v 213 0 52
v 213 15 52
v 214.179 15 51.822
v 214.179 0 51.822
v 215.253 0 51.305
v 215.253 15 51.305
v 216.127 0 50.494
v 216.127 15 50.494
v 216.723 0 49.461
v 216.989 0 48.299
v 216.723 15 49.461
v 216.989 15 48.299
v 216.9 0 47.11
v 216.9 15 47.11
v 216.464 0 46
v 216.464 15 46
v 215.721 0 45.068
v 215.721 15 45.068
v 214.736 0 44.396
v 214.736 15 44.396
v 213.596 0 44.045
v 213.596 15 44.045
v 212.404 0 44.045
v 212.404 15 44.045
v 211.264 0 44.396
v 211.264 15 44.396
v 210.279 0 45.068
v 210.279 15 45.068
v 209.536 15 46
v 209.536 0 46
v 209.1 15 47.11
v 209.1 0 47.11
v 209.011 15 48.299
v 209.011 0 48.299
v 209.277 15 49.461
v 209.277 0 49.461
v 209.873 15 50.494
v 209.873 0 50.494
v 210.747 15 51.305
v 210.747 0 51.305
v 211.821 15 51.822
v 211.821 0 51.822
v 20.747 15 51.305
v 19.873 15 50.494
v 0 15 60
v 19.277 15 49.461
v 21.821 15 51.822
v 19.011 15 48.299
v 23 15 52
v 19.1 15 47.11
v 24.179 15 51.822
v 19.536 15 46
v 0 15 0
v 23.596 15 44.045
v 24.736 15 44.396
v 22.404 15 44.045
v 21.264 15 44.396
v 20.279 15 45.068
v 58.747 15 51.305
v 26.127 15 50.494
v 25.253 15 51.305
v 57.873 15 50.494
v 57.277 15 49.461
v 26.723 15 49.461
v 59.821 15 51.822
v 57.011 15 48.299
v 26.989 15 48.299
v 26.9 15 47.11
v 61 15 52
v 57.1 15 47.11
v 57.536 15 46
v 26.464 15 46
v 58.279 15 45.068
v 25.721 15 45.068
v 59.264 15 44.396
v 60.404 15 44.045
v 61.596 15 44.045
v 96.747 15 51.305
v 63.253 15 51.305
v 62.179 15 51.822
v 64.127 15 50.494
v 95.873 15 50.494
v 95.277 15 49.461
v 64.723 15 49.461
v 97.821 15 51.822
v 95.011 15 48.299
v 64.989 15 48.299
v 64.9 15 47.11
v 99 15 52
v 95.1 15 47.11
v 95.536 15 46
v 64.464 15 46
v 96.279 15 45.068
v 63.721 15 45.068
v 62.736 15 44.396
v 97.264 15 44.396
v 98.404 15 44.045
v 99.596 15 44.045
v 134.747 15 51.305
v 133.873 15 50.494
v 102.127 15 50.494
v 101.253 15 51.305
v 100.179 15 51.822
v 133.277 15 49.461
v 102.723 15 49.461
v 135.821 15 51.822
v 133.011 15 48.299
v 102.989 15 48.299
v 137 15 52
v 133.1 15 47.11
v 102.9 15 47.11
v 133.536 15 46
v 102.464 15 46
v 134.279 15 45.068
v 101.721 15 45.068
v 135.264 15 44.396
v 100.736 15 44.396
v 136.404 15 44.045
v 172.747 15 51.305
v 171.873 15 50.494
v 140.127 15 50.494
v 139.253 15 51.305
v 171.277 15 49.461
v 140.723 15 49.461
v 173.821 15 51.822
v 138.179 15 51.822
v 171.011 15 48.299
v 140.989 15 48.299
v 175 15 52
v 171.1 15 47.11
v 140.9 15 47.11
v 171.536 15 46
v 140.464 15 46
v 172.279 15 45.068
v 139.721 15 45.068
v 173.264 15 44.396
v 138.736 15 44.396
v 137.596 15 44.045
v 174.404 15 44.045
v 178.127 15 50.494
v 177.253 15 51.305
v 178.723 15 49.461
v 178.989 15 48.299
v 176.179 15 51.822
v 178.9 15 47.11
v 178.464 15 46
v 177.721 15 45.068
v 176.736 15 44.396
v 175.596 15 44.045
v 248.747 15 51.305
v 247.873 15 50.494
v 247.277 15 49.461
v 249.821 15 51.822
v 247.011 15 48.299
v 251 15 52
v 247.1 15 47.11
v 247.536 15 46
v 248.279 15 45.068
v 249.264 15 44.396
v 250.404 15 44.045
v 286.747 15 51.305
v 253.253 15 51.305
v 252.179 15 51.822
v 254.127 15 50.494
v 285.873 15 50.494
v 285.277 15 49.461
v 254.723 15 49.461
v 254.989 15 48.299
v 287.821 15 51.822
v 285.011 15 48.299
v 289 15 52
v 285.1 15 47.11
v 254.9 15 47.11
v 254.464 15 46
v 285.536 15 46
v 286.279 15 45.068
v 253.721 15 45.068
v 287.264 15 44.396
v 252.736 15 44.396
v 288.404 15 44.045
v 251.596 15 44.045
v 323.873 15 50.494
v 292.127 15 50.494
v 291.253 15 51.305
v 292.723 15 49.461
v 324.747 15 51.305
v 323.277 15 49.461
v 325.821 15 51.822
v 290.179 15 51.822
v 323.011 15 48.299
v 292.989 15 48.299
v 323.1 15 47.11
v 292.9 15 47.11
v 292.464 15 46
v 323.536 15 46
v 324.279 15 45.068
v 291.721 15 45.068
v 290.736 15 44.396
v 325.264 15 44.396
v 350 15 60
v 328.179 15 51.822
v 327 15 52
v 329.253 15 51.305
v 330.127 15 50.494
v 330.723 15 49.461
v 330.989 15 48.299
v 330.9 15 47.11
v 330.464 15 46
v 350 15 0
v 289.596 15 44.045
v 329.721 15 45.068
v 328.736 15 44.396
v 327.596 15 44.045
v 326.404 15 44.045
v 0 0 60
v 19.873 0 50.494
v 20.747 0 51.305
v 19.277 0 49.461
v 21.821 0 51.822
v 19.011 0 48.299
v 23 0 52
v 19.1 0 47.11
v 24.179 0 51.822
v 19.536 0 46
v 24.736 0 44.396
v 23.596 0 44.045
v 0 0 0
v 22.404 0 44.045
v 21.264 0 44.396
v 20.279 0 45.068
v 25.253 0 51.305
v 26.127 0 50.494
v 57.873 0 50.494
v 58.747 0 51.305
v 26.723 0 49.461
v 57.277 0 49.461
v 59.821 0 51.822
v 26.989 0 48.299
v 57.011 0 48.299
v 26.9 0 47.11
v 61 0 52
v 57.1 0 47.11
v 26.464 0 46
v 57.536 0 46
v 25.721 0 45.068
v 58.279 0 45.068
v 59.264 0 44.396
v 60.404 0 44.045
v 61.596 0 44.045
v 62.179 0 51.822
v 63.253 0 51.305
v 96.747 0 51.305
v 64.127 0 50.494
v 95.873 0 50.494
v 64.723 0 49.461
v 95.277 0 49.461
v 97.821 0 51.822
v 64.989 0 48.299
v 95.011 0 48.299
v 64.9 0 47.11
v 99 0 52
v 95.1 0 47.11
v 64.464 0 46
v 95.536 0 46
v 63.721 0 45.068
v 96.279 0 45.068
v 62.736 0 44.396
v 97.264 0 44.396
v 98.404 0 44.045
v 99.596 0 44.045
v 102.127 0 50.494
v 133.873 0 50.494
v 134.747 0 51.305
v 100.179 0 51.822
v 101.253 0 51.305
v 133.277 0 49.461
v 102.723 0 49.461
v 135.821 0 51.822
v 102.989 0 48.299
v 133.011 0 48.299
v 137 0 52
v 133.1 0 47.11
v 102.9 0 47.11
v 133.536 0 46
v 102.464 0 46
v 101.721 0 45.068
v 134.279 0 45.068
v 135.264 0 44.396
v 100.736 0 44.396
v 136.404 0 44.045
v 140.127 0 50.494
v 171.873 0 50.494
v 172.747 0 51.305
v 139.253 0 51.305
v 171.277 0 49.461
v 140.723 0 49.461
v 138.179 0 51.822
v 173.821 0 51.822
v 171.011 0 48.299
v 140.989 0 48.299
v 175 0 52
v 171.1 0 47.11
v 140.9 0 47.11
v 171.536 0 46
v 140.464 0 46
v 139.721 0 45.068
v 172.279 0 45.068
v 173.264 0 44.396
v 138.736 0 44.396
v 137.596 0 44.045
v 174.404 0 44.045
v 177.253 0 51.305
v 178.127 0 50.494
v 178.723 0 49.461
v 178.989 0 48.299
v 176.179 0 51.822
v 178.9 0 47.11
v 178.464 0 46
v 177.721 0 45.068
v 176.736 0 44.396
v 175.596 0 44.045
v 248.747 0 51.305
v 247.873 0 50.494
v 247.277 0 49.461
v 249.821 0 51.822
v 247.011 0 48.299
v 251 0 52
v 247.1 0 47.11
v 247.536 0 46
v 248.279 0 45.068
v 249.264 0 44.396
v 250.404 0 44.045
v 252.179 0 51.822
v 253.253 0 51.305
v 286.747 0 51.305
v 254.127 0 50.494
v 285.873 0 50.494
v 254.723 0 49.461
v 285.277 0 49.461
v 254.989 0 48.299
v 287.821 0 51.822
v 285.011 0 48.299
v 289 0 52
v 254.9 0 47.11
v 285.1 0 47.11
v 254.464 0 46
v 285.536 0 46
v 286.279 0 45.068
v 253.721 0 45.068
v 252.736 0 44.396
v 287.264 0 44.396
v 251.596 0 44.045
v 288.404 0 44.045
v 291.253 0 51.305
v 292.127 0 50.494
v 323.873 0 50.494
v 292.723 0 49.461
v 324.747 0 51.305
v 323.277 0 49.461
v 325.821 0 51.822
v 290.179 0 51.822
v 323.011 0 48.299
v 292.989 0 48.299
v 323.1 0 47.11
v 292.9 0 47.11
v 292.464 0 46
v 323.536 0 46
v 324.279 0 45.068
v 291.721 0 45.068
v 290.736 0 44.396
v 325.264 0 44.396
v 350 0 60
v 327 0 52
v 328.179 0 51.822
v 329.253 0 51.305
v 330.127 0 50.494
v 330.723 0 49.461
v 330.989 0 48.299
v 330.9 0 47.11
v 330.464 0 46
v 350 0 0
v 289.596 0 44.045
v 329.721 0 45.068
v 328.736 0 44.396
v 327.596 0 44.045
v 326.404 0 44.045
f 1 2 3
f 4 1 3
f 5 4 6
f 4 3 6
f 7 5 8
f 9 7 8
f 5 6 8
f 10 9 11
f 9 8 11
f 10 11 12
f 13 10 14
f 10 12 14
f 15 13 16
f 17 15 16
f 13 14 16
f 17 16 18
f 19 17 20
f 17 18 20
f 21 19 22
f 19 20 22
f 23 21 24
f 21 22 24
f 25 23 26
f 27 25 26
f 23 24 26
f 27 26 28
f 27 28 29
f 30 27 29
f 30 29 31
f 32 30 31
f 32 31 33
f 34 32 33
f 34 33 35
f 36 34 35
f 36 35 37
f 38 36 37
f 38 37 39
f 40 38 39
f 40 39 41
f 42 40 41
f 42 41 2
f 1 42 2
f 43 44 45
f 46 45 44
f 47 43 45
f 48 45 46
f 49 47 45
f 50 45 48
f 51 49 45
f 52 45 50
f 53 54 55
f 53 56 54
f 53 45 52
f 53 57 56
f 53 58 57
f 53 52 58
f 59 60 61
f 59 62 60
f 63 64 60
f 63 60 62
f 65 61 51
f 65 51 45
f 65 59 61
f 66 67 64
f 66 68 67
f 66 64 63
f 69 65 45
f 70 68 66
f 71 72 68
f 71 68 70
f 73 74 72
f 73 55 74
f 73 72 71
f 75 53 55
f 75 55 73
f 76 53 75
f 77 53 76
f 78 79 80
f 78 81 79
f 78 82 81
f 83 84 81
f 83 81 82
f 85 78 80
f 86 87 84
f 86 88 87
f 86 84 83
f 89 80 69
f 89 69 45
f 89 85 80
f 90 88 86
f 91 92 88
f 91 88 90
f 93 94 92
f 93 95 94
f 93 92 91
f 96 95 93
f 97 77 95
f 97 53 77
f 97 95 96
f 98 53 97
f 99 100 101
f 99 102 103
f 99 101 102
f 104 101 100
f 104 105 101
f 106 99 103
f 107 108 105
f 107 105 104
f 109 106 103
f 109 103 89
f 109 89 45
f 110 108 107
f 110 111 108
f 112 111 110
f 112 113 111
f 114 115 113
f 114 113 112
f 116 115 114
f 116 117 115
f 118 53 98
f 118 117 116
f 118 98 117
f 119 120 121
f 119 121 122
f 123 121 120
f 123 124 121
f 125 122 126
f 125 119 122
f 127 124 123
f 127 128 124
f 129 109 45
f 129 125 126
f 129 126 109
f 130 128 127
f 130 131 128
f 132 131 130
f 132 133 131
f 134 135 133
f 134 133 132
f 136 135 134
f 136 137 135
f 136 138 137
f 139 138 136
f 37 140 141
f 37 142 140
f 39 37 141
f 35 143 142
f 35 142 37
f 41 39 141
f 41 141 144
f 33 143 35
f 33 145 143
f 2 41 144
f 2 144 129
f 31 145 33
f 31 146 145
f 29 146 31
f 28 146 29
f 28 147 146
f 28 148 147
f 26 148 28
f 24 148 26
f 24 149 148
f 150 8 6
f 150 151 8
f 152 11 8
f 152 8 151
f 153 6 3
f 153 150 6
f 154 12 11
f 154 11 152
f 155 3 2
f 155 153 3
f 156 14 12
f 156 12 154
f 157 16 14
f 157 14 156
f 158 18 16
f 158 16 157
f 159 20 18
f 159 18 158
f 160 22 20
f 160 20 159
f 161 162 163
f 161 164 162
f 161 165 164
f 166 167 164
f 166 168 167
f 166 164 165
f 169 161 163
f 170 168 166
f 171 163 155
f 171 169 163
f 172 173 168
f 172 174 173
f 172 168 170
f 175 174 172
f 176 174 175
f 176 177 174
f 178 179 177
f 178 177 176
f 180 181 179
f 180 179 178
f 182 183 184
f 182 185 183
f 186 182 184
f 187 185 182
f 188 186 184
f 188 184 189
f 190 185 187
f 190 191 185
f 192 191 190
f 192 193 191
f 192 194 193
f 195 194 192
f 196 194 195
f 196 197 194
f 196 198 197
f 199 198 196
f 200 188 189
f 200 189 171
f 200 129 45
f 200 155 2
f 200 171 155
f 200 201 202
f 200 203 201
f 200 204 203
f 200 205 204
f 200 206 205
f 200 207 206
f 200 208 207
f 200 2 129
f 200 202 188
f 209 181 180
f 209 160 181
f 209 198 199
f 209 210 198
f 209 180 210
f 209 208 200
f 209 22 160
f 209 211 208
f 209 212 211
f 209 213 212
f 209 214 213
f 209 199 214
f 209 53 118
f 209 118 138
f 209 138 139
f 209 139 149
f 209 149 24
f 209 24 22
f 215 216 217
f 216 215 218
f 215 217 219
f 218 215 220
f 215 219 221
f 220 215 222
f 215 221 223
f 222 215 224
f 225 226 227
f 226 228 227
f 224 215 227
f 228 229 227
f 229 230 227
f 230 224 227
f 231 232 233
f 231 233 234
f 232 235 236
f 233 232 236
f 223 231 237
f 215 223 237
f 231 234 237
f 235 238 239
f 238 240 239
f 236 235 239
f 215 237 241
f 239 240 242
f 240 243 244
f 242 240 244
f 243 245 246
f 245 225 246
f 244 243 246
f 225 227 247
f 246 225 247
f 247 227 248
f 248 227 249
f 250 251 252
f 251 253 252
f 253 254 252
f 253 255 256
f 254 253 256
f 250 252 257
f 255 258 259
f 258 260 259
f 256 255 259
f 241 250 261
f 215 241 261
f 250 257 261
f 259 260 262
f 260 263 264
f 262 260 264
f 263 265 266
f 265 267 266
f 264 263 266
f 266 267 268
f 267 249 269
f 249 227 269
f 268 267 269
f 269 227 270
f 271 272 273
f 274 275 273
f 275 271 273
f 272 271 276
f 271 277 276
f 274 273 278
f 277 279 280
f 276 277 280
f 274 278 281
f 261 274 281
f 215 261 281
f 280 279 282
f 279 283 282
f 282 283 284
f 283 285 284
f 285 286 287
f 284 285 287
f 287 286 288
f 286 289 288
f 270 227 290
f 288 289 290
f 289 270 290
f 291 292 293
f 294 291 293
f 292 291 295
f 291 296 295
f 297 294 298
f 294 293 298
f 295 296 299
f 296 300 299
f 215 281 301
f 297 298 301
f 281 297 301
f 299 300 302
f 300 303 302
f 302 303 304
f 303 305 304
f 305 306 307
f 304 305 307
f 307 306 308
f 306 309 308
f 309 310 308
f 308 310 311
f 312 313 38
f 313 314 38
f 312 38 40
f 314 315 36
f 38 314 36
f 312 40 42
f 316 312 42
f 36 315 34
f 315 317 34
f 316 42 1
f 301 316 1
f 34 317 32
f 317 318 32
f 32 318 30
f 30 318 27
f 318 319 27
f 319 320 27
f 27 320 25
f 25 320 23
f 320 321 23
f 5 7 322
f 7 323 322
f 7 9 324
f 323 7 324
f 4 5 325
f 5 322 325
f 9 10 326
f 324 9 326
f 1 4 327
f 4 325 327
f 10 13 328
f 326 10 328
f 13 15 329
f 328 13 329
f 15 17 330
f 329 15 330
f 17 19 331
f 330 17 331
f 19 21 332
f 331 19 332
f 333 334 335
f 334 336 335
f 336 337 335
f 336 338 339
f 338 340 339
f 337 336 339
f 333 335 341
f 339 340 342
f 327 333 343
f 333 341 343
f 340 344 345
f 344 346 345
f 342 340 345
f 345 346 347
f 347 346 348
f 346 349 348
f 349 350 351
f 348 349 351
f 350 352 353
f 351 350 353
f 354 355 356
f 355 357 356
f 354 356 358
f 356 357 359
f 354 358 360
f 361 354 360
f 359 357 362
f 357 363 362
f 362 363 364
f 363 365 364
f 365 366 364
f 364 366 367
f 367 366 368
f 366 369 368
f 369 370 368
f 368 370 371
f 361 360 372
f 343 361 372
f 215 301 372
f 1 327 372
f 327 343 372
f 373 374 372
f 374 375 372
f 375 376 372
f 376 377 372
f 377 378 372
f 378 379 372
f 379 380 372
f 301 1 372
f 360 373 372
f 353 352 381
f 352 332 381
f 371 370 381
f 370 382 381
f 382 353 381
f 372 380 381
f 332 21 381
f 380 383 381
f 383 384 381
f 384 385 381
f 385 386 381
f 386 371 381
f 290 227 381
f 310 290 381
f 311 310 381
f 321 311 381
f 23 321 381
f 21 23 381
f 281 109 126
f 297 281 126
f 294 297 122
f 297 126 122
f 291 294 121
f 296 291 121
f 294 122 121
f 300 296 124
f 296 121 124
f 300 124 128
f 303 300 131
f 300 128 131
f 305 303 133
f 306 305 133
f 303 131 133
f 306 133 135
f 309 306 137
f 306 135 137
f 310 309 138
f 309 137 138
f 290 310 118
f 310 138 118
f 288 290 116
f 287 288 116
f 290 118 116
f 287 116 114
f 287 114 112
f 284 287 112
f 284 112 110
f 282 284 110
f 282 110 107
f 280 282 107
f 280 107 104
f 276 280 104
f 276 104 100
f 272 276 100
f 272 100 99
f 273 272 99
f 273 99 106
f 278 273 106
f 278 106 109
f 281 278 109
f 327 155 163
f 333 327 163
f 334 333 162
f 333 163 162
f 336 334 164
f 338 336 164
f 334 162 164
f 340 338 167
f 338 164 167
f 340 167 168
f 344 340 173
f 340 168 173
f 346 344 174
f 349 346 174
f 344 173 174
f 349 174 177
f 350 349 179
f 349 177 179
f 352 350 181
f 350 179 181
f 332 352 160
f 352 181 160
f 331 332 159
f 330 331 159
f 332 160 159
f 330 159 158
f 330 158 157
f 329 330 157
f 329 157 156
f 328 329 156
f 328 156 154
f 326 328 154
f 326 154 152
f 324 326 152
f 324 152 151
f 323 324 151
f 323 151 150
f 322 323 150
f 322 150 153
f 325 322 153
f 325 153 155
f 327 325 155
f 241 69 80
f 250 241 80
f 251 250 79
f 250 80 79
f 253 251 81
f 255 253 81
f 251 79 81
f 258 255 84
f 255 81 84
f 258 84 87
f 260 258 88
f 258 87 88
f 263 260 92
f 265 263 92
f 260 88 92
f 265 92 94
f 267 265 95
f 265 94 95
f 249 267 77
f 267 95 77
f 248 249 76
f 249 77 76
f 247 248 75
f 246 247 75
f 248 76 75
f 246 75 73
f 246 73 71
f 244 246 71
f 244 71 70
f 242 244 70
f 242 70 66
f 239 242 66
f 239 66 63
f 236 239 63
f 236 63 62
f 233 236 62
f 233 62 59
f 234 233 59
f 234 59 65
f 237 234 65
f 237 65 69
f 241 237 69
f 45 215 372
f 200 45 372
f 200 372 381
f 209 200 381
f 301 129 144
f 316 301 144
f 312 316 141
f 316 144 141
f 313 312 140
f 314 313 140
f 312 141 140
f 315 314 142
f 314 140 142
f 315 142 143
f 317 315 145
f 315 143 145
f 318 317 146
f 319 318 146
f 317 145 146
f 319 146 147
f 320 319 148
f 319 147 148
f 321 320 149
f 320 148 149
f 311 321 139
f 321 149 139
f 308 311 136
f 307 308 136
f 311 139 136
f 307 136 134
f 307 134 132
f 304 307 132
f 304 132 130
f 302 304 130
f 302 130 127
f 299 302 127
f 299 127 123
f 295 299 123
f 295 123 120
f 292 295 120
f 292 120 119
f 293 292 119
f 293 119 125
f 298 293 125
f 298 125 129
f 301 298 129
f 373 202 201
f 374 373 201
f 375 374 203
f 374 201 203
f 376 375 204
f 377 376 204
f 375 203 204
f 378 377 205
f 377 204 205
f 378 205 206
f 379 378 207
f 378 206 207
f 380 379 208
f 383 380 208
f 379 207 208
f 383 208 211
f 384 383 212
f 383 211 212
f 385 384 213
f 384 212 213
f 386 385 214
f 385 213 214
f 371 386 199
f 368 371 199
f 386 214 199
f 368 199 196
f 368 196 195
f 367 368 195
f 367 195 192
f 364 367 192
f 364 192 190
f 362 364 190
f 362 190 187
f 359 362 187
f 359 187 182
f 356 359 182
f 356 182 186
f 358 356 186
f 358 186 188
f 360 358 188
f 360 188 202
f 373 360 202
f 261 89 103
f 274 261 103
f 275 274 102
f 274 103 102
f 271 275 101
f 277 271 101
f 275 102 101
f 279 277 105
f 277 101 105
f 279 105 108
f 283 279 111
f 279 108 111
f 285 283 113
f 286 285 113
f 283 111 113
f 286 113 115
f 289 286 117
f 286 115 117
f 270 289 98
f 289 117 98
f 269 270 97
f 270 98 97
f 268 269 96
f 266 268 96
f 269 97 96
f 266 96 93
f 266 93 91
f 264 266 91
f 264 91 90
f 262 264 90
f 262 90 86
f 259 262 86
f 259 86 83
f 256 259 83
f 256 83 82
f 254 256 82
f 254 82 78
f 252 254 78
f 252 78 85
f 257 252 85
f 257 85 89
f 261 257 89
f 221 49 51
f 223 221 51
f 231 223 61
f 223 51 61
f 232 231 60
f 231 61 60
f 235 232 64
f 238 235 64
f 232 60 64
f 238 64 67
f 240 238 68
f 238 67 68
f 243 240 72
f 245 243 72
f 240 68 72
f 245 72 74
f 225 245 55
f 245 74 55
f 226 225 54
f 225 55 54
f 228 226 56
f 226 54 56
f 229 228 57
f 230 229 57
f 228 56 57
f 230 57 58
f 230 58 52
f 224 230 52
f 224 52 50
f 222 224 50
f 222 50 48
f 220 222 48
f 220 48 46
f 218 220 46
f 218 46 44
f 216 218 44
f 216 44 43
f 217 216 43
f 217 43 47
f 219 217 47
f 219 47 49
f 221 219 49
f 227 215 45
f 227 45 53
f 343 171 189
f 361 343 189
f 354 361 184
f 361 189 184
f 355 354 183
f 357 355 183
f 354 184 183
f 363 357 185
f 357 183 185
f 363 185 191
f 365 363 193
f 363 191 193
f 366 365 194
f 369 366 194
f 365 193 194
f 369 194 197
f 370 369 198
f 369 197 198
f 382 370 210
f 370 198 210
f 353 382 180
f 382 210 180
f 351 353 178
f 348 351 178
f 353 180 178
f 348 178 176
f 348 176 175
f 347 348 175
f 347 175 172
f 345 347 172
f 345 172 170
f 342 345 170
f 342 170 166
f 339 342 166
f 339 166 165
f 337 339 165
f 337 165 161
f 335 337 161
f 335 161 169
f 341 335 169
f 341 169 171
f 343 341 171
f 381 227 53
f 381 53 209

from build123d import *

# Parameters (mm, degrees)
SKETCH1_W           = 350
SKETCH1_H           = 60
BOSS_EXTRUDE1_DEPTH = 15
SKETCH2_R           = 4
CUT_EXTRUDE1_DEPTH  = 356.422284051


with BuildPart() as part:
    # Sketch1 → Boss-Extrude1 (new body)
    with BuildSketch(Plane(origin=(0, 0, 0), x_dir=(1, 0, 0), z_dir=(0, 1, 0))):
        with Locations((175, -30)):
            Rectangle(SKETCH1_W, SKETCH1_H)
    extrude(amount=BOSS_EXTRUDE1_DEPTH)

    # Sketch2 → Cut-Extrude1 (cut, through all)
    with BuildSketch(Plane(origin=(0, 15, 0), x_dir=(1, 0, 0), z_dir=(0, 1, 0))):
        with Locations(Location((23, -48, 0), (0, 0, 270))):
            Circle(SKETCH2_R)
        with Locations(Location((61, -48, 0), (0, 0, 270))):
            Circle(SKETCH2_R)
        with Locations(Location((99, -48, 0), (0, 0, 270))):
            Circle(SKETCH2_R)
        with Locations(Location((137, -48, 0), (0, 0, 270))):
            Circle(SKETCH2_R)
        with Locations(Location((175, -48, 0), (0, 0, 270))):
            Circle(SKETCH2_R)
        with Locations(Location((213, -48, 0), (0, 0, 270))):
            Circle(SKETCH2_R)
        with Locations(Location((251, -48, 0), (0, 0, 270))):
            Circle(SKETCH2_R)
        with Locations(Location((289, -48, 0), (0, 0, 270))):
            Circle(SKETCH2_R)
        with Locations(Location((327, -48, 0), (0, 0, 270))):
            Circle(SKETCH2_R)
    extrude(amount=-CUT_EXTRUDE1_DEPTH, mode=Mode.SUBTRACT)


solid = part.part
